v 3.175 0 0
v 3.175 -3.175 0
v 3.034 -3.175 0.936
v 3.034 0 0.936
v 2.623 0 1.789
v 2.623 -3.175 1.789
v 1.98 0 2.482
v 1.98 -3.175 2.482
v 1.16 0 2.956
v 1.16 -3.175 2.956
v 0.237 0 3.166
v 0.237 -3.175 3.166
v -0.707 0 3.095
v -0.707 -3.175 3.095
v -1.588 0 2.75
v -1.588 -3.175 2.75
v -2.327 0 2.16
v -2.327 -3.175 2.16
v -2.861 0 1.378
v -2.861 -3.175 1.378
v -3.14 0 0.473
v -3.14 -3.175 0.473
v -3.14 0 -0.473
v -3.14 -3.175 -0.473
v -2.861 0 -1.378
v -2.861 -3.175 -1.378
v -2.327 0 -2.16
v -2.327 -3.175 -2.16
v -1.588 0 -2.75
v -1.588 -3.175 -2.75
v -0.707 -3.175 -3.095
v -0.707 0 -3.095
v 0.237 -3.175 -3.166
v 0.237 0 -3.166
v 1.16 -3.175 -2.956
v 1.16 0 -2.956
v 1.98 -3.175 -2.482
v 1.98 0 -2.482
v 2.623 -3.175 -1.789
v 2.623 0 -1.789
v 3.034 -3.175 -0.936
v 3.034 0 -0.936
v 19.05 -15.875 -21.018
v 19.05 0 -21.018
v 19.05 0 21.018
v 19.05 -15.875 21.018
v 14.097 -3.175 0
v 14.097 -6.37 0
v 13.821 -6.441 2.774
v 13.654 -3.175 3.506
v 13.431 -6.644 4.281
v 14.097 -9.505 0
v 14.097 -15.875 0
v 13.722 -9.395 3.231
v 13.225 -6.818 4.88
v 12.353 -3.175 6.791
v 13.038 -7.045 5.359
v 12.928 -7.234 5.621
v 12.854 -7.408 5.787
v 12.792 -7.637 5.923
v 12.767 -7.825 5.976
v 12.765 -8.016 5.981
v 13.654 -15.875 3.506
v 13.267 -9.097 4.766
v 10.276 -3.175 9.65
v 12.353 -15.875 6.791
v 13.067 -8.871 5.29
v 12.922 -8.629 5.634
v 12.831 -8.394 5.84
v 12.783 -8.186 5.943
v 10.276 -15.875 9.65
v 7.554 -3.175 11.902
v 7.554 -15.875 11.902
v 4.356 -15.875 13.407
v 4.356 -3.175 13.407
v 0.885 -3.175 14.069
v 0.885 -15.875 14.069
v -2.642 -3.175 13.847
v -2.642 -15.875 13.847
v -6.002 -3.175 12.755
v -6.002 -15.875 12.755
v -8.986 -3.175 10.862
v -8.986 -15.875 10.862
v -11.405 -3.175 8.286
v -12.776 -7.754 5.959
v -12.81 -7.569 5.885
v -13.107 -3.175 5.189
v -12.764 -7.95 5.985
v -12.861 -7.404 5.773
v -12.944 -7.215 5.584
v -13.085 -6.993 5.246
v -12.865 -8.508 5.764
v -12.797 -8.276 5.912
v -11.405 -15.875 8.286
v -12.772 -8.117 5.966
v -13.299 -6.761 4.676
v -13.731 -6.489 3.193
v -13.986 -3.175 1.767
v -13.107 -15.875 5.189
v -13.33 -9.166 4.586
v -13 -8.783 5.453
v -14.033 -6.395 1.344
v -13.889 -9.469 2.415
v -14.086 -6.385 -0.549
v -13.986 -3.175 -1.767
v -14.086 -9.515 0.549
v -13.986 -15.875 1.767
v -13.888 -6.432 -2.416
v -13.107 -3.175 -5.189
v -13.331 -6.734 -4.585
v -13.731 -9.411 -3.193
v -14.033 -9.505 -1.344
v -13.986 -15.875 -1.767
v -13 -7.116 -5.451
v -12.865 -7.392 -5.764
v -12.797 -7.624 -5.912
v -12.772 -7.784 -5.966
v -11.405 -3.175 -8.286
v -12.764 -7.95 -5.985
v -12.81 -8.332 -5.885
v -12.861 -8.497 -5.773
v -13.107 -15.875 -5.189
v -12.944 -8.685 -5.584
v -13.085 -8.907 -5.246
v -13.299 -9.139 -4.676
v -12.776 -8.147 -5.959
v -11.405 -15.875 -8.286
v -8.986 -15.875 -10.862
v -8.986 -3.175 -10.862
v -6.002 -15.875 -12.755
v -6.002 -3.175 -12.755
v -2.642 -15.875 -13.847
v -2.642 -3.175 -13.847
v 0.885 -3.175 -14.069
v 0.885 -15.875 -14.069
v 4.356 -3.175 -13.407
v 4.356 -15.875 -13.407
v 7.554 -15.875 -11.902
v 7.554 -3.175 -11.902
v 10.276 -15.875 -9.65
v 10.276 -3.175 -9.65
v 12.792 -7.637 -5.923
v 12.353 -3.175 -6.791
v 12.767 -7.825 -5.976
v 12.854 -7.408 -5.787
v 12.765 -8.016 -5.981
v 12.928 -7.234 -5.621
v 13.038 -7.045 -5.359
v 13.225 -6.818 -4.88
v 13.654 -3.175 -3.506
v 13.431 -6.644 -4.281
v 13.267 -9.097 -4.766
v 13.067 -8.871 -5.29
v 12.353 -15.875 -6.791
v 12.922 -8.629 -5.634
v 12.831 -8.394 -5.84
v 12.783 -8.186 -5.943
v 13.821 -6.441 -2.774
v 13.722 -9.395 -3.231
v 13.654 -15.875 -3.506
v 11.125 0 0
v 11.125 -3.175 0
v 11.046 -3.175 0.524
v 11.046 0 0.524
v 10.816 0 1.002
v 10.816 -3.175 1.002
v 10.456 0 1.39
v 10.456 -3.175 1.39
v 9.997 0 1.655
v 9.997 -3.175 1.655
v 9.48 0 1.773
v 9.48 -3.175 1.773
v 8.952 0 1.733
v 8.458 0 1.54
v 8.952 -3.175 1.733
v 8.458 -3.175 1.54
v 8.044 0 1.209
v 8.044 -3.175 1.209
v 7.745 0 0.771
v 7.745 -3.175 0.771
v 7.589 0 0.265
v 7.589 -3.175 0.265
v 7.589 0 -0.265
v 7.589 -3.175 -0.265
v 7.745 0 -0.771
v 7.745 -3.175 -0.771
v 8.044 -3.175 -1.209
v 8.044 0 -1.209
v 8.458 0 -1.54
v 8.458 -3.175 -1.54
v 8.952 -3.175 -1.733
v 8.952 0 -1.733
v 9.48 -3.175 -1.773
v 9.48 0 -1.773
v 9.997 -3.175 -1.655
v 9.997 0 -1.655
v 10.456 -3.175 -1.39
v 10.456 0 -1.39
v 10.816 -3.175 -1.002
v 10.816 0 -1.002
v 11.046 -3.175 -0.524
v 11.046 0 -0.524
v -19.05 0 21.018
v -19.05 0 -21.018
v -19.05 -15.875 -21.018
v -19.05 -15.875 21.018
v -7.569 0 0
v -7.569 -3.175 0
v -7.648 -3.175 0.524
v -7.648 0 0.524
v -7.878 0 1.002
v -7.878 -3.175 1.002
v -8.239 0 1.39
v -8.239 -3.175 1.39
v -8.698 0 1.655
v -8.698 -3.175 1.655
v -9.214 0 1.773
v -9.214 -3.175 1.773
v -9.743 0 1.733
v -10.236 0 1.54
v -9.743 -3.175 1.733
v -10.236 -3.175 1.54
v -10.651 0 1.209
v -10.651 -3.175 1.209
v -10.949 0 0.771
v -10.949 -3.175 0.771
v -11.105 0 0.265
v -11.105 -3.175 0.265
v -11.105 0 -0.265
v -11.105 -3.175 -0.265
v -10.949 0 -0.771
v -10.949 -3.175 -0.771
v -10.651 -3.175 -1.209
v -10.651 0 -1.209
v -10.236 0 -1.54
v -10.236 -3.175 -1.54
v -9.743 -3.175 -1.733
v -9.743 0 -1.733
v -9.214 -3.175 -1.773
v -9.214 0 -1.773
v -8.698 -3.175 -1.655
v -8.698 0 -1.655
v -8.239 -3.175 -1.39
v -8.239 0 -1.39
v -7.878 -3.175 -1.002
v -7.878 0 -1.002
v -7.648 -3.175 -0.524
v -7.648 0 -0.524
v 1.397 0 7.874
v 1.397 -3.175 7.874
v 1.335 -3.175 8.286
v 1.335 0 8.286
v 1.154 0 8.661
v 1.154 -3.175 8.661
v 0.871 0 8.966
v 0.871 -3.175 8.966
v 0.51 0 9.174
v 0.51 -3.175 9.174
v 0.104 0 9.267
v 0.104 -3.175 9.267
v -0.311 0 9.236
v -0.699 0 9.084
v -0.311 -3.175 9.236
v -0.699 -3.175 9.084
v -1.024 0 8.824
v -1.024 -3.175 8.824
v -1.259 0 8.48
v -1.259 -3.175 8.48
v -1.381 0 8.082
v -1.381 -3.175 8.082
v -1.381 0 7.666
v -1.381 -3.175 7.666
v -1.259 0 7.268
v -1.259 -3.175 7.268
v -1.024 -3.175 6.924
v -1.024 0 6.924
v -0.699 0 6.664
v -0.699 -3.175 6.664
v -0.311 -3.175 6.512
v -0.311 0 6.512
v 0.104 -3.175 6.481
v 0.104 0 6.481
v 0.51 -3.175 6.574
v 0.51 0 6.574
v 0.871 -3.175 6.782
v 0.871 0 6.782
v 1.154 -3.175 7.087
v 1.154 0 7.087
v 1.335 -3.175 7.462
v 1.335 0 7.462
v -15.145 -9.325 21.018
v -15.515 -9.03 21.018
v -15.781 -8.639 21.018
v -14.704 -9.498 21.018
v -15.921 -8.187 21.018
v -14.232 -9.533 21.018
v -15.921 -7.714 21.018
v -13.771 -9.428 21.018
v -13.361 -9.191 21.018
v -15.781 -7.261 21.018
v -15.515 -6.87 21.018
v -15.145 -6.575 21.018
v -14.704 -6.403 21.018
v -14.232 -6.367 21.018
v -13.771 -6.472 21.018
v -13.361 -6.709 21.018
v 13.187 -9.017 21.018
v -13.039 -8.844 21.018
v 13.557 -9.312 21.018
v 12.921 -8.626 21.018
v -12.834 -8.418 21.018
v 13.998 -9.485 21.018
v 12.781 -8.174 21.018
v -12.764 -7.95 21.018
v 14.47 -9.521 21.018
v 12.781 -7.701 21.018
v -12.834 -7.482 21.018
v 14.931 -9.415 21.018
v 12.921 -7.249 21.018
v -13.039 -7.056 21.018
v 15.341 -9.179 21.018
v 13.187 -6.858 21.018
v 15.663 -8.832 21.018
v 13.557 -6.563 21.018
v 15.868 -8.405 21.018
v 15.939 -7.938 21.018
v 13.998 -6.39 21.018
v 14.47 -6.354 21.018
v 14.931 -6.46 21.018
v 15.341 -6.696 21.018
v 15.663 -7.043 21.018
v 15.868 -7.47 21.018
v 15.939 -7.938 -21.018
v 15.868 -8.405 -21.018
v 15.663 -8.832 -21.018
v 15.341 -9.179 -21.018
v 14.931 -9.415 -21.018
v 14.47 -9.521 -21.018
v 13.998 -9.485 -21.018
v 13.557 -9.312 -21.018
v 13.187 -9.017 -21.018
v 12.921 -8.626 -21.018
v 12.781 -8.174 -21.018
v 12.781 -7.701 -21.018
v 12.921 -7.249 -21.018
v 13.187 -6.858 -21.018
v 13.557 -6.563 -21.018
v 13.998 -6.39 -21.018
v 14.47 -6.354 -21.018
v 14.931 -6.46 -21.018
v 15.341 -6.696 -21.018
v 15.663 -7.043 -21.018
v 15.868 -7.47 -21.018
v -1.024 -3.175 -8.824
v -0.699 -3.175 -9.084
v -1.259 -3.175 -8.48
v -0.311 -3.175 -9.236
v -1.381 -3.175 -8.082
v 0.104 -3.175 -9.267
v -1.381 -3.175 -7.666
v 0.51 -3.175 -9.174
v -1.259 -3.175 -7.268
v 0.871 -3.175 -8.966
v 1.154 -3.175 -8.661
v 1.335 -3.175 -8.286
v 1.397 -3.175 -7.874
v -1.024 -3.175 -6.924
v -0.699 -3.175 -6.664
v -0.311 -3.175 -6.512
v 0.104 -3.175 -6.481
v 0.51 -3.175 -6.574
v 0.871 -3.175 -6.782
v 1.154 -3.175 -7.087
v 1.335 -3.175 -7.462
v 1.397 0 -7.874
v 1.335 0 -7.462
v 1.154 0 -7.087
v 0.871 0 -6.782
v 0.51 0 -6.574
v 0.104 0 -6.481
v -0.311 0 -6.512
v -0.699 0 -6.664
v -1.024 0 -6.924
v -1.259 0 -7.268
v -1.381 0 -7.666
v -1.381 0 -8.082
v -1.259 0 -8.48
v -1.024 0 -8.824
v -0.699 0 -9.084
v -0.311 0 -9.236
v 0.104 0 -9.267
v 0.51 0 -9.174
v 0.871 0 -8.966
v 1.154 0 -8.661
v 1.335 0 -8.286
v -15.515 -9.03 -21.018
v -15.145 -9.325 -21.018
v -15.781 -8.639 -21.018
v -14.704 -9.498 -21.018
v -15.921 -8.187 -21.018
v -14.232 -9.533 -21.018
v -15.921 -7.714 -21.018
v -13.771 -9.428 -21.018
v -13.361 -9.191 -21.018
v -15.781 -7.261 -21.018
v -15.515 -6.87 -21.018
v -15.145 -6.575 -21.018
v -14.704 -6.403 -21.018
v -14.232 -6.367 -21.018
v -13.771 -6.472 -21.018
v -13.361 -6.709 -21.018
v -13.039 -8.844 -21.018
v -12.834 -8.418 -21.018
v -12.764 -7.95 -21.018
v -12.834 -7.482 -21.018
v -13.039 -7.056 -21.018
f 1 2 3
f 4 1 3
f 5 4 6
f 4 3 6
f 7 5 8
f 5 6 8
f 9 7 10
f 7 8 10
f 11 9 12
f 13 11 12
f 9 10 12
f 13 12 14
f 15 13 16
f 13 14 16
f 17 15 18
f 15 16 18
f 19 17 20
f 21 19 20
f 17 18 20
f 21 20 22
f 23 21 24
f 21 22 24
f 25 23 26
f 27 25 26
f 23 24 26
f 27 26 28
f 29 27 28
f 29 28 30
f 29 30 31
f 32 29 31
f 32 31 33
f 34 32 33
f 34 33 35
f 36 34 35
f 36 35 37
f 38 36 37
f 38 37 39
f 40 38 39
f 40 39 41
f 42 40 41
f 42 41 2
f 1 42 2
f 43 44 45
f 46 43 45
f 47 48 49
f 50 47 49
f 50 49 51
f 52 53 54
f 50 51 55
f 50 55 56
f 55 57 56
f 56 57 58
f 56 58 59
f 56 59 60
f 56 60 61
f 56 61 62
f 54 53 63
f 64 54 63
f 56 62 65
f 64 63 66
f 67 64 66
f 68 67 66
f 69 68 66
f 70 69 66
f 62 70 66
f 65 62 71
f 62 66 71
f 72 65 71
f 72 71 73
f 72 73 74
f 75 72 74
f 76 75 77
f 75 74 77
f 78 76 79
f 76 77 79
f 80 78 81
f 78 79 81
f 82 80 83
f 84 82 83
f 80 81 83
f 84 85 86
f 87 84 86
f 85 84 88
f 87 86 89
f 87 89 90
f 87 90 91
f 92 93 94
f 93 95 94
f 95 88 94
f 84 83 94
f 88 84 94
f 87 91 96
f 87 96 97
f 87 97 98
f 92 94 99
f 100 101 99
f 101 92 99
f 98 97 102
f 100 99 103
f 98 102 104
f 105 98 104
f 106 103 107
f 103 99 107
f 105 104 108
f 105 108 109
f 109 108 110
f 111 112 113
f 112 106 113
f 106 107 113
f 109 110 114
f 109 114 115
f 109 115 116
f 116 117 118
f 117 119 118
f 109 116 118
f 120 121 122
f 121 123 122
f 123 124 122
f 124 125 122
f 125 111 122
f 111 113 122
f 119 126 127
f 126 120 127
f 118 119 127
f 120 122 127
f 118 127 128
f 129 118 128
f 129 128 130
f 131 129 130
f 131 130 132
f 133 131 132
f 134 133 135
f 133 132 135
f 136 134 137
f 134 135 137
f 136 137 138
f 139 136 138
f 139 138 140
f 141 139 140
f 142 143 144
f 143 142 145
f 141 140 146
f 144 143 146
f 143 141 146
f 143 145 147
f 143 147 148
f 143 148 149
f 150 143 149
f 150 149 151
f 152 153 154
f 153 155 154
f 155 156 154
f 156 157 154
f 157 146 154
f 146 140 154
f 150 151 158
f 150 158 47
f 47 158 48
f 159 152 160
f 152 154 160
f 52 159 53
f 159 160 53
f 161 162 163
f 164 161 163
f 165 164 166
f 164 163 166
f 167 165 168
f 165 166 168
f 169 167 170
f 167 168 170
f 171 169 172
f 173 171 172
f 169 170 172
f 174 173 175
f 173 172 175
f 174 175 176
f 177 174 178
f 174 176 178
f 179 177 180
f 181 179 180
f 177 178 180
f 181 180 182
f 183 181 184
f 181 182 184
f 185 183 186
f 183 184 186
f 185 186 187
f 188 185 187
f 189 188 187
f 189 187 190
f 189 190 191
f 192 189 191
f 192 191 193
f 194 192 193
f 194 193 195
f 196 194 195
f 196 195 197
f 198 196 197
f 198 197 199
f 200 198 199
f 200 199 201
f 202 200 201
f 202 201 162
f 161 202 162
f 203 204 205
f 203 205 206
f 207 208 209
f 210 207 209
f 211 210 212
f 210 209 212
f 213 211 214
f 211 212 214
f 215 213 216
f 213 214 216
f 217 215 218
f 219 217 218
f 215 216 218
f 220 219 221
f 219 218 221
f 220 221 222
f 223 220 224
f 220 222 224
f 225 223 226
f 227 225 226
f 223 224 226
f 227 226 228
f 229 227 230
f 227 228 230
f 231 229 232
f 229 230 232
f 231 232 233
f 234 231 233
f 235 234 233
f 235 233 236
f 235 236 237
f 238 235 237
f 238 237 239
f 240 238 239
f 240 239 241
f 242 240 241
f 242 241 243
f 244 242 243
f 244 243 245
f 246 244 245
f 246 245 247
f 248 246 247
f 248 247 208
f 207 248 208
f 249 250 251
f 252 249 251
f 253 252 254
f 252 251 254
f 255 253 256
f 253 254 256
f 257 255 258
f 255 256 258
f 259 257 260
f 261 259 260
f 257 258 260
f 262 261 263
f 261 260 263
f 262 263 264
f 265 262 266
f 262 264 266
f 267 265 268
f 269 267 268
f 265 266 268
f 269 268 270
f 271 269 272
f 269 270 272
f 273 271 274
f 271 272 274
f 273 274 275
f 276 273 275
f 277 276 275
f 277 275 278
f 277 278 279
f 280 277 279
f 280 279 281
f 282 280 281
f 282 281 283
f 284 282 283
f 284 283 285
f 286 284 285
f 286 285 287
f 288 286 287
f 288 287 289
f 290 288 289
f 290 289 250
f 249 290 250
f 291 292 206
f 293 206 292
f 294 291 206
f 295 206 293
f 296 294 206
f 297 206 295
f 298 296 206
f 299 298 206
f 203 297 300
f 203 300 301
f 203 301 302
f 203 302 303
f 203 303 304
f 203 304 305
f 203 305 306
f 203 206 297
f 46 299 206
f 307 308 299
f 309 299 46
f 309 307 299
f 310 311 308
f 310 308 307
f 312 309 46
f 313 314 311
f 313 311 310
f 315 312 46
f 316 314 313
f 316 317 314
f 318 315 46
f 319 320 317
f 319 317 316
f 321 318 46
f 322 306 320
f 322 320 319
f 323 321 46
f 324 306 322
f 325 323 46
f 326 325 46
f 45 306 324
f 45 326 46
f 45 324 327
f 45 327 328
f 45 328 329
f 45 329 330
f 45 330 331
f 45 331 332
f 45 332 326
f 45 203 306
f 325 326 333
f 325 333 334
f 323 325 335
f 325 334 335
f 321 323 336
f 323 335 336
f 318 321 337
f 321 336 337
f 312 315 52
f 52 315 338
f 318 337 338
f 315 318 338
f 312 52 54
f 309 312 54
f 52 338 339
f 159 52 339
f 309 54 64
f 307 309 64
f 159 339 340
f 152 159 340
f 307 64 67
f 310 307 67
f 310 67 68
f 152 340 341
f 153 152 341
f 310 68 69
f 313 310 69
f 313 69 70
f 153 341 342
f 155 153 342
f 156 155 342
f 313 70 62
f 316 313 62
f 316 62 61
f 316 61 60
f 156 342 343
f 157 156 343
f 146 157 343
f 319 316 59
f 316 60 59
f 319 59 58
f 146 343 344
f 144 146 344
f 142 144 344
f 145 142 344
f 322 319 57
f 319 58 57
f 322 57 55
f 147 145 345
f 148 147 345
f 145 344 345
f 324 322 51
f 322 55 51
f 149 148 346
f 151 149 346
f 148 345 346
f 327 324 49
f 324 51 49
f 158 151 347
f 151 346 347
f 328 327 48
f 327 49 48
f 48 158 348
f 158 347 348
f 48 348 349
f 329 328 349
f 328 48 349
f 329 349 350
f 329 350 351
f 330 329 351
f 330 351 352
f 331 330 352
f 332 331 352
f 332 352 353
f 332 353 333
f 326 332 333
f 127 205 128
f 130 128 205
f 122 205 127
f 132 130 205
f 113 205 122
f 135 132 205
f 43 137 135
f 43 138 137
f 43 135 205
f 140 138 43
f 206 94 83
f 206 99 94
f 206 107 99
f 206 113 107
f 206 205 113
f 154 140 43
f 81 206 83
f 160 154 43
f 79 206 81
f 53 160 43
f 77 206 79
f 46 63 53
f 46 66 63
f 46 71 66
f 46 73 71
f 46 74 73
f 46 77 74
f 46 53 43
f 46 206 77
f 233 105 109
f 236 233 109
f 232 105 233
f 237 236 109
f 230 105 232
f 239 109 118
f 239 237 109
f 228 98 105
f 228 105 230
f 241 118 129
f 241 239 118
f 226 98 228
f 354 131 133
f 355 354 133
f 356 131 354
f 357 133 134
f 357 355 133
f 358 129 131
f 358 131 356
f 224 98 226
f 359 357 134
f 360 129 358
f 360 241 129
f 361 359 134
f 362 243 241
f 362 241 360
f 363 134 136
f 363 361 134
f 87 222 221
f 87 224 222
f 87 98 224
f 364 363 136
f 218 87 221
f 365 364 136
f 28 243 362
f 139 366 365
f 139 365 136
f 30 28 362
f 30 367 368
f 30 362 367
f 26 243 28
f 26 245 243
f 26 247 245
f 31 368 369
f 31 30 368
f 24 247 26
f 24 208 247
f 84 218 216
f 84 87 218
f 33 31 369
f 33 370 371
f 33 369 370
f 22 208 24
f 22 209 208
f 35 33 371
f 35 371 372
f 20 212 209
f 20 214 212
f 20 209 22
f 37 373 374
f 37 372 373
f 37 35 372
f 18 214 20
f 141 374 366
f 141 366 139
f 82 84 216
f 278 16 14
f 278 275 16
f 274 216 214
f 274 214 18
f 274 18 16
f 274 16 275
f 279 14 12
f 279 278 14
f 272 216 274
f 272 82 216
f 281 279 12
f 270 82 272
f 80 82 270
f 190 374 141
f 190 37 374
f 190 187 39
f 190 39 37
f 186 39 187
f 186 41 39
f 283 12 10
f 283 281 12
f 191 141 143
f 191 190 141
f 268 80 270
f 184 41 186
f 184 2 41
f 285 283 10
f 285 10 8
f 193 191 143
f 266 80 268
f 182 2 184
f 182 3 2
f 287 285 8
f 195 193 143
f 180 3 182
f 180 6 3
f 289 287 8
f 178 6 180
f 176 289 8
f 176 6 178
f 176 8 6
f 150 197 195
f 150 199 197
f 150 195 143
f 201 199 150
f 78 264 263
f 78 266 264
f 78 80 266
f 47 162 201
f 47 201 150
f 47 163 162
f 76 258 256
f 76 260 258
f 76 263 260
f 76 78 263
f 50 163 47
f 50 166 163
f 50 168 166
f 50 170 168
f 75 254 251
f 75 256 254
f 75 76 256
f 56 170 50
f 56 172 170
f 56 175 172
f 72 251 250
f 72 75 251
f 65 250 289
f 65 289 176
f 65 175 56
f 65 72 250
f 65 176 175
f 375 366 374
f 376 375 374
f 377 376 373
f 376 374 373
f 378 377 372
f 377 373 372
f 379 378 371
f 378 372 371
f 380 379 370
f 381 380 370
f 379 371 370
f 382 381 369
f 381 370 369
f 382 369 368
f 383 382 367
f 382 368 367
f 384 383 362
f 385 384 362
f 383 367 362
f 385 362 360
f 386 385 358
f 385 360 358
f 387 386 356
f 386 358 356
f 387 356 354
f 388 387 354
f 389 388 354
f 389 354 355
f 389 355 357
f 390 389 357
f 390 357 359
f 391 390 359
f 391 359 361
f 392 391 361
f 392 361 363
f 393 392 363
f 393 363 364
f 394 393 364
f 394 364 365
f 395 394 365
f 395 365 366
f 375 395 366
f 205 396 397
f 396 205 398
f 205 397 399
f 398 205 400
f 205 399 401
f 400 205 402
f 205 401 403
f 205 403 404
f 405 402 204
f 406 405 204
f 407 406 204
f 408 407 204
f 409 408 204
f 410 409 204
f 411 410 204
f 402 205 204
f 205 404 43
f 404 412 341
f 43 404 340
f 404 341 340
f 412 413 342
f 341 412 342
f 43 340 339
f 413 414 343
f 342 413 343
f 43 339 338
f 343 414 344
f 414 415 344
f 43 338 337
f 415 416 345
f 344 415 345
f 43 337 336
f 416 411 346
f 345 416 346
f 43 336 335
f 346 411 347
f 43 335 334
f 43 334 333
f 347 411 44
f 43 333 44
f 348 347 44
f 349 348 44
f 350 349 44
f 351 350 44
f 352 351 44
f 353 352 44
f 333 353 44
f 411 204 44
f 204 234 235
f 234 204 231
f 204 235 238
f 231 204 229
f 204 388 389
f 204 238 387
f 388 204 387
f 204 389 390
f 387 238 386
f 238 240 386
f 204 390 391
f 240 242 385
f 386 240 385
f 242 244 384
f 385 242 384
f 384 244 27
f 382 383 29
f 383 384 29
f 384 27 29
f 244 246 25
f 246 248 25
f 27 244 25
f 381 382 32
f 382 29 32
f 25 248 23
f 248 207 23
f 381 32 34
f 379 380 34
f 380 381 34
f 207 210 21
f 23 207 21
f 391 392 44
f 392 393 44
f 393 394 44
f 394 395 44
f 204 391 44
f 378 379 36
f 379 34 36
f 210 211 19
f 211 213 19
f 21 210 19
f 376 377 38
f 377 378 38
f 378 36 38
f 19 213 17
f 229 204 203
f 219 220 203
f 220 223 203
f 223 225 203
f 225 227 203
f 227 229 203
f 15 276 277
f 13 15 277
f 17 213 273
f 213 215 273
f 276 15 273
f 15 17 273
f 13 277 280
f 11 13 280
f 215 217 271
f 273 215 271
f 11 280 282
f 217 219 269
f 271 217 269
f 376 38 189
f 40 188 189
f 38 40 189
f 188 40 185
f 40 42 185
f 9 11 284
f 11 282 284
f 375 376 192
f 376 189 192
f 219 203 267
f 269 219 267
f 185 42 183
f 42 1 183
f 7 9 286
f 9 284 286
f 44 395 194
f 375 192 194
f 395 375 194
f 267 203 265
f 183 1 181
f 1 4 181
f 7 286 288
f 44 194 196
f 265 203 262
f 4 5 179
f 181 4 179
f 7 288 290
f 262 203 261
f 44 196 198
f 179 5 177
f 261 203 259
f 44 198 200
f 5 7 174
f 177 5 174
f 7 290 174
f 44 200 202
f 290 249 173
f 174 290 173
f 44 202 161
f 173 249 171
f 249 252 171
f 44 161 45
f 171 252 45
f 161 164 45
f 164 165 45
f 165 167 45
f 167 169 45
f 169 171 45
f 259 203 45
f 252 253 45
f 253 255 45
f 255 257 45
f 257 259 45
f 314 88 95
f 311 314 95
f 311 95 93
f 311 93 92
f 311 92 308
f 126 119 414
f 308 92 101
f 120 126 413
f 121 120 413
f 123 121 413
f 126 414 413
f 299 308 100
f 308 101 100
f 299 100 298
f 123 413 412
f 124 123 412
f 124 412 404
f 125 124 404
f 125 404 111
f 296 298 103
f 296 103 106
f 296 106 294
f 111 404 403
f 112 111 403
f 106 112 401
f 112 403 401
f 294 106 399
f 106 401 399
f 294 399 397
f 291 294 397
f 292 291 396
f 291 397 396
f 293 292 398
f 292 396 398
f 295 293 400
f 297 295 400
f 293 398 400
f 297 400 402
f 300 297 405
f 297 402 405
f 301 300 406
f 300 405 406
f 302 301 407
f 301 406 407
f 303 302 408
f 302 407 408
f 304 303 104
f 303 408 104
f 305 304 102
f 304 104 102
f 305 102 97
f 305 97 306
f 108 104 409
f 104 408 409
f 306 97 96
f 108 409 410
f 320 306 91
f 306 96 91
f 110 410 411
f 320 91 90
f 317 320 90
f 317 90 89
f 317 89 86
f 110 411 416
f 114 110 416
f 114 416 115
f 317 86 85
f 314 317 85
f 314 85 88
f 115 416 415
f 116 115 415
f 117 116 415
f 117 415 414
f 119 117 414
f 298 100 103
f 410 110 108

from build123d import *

# Parameters (mm, degrees)
F0_W     = 38.1
F0_H     = 42.037
F1_DEPTH = 15.875
F2_R     = 3.175
F3_DEPTH = 15.876
F4_R     = 14.097
F5_DEPTH = 12.7
F6_R     = 1.397
F6_R_2   = 1.778
F7_DEPTH = 3.176
F8_R     = 1.5875
F9_DEPTH = 42.038


with BuildPart() as f1:
    # F0 (on Front) → F1 (new body)
    with BuildSketch(Plane.XZ):
        Rectangle(F0_W, F0_H)
    extrude(amount=F1_DEPTH)

    # F2 (on face) → F3 (cut, through all)
    with BuildSketch(Plane.XZ.offset(15.875)):
        Circle(F2_R)
    extrude(amount=-F3_DEPTH, mode=Mode.SUBTRACT)

    # F4 (on face) → F5 (cut)
    with BuildSketch(Plane.XZ.offset(15.875)):
        Circle(F4_R)
    extrude(amount=-F5_DEPTH, mode=Mode.SUBTRACT)

    # F6 (on face) → F7 (cut, through all)
    with BuildSketch(Plane.XZ.offset(3.175)):
        with Locations((0, 7.874)):
            Circle(F6_R)
        with Locations((-9.3472, 0)):
            Circle(F6_R_2)
        with Locations((0, -7.874)):
            Circle(F6_R)
        with Locations((9.3472, 0)):
            Circle(F6_R_2)
    extrude(amount=-F7_DEPTH, mode=Mode.SUBTRACT)

    # F8 (on face) → F9 (cut, through all)
    with BuildSketch(Plane(origin=(0, 0, -21.0185), x_dir=(1, 0, 0), z_dir=(0, 0, -1))):
        with Locations((-14.351, 7.9502)):
            Circle(F8_R)
        with Locations((14.351, 7.9375)):
            Circle(F8_R)
    extrude(amount=-F9_DEPTH, mode=Mode.SUBTRACT)


solid = f1.part
